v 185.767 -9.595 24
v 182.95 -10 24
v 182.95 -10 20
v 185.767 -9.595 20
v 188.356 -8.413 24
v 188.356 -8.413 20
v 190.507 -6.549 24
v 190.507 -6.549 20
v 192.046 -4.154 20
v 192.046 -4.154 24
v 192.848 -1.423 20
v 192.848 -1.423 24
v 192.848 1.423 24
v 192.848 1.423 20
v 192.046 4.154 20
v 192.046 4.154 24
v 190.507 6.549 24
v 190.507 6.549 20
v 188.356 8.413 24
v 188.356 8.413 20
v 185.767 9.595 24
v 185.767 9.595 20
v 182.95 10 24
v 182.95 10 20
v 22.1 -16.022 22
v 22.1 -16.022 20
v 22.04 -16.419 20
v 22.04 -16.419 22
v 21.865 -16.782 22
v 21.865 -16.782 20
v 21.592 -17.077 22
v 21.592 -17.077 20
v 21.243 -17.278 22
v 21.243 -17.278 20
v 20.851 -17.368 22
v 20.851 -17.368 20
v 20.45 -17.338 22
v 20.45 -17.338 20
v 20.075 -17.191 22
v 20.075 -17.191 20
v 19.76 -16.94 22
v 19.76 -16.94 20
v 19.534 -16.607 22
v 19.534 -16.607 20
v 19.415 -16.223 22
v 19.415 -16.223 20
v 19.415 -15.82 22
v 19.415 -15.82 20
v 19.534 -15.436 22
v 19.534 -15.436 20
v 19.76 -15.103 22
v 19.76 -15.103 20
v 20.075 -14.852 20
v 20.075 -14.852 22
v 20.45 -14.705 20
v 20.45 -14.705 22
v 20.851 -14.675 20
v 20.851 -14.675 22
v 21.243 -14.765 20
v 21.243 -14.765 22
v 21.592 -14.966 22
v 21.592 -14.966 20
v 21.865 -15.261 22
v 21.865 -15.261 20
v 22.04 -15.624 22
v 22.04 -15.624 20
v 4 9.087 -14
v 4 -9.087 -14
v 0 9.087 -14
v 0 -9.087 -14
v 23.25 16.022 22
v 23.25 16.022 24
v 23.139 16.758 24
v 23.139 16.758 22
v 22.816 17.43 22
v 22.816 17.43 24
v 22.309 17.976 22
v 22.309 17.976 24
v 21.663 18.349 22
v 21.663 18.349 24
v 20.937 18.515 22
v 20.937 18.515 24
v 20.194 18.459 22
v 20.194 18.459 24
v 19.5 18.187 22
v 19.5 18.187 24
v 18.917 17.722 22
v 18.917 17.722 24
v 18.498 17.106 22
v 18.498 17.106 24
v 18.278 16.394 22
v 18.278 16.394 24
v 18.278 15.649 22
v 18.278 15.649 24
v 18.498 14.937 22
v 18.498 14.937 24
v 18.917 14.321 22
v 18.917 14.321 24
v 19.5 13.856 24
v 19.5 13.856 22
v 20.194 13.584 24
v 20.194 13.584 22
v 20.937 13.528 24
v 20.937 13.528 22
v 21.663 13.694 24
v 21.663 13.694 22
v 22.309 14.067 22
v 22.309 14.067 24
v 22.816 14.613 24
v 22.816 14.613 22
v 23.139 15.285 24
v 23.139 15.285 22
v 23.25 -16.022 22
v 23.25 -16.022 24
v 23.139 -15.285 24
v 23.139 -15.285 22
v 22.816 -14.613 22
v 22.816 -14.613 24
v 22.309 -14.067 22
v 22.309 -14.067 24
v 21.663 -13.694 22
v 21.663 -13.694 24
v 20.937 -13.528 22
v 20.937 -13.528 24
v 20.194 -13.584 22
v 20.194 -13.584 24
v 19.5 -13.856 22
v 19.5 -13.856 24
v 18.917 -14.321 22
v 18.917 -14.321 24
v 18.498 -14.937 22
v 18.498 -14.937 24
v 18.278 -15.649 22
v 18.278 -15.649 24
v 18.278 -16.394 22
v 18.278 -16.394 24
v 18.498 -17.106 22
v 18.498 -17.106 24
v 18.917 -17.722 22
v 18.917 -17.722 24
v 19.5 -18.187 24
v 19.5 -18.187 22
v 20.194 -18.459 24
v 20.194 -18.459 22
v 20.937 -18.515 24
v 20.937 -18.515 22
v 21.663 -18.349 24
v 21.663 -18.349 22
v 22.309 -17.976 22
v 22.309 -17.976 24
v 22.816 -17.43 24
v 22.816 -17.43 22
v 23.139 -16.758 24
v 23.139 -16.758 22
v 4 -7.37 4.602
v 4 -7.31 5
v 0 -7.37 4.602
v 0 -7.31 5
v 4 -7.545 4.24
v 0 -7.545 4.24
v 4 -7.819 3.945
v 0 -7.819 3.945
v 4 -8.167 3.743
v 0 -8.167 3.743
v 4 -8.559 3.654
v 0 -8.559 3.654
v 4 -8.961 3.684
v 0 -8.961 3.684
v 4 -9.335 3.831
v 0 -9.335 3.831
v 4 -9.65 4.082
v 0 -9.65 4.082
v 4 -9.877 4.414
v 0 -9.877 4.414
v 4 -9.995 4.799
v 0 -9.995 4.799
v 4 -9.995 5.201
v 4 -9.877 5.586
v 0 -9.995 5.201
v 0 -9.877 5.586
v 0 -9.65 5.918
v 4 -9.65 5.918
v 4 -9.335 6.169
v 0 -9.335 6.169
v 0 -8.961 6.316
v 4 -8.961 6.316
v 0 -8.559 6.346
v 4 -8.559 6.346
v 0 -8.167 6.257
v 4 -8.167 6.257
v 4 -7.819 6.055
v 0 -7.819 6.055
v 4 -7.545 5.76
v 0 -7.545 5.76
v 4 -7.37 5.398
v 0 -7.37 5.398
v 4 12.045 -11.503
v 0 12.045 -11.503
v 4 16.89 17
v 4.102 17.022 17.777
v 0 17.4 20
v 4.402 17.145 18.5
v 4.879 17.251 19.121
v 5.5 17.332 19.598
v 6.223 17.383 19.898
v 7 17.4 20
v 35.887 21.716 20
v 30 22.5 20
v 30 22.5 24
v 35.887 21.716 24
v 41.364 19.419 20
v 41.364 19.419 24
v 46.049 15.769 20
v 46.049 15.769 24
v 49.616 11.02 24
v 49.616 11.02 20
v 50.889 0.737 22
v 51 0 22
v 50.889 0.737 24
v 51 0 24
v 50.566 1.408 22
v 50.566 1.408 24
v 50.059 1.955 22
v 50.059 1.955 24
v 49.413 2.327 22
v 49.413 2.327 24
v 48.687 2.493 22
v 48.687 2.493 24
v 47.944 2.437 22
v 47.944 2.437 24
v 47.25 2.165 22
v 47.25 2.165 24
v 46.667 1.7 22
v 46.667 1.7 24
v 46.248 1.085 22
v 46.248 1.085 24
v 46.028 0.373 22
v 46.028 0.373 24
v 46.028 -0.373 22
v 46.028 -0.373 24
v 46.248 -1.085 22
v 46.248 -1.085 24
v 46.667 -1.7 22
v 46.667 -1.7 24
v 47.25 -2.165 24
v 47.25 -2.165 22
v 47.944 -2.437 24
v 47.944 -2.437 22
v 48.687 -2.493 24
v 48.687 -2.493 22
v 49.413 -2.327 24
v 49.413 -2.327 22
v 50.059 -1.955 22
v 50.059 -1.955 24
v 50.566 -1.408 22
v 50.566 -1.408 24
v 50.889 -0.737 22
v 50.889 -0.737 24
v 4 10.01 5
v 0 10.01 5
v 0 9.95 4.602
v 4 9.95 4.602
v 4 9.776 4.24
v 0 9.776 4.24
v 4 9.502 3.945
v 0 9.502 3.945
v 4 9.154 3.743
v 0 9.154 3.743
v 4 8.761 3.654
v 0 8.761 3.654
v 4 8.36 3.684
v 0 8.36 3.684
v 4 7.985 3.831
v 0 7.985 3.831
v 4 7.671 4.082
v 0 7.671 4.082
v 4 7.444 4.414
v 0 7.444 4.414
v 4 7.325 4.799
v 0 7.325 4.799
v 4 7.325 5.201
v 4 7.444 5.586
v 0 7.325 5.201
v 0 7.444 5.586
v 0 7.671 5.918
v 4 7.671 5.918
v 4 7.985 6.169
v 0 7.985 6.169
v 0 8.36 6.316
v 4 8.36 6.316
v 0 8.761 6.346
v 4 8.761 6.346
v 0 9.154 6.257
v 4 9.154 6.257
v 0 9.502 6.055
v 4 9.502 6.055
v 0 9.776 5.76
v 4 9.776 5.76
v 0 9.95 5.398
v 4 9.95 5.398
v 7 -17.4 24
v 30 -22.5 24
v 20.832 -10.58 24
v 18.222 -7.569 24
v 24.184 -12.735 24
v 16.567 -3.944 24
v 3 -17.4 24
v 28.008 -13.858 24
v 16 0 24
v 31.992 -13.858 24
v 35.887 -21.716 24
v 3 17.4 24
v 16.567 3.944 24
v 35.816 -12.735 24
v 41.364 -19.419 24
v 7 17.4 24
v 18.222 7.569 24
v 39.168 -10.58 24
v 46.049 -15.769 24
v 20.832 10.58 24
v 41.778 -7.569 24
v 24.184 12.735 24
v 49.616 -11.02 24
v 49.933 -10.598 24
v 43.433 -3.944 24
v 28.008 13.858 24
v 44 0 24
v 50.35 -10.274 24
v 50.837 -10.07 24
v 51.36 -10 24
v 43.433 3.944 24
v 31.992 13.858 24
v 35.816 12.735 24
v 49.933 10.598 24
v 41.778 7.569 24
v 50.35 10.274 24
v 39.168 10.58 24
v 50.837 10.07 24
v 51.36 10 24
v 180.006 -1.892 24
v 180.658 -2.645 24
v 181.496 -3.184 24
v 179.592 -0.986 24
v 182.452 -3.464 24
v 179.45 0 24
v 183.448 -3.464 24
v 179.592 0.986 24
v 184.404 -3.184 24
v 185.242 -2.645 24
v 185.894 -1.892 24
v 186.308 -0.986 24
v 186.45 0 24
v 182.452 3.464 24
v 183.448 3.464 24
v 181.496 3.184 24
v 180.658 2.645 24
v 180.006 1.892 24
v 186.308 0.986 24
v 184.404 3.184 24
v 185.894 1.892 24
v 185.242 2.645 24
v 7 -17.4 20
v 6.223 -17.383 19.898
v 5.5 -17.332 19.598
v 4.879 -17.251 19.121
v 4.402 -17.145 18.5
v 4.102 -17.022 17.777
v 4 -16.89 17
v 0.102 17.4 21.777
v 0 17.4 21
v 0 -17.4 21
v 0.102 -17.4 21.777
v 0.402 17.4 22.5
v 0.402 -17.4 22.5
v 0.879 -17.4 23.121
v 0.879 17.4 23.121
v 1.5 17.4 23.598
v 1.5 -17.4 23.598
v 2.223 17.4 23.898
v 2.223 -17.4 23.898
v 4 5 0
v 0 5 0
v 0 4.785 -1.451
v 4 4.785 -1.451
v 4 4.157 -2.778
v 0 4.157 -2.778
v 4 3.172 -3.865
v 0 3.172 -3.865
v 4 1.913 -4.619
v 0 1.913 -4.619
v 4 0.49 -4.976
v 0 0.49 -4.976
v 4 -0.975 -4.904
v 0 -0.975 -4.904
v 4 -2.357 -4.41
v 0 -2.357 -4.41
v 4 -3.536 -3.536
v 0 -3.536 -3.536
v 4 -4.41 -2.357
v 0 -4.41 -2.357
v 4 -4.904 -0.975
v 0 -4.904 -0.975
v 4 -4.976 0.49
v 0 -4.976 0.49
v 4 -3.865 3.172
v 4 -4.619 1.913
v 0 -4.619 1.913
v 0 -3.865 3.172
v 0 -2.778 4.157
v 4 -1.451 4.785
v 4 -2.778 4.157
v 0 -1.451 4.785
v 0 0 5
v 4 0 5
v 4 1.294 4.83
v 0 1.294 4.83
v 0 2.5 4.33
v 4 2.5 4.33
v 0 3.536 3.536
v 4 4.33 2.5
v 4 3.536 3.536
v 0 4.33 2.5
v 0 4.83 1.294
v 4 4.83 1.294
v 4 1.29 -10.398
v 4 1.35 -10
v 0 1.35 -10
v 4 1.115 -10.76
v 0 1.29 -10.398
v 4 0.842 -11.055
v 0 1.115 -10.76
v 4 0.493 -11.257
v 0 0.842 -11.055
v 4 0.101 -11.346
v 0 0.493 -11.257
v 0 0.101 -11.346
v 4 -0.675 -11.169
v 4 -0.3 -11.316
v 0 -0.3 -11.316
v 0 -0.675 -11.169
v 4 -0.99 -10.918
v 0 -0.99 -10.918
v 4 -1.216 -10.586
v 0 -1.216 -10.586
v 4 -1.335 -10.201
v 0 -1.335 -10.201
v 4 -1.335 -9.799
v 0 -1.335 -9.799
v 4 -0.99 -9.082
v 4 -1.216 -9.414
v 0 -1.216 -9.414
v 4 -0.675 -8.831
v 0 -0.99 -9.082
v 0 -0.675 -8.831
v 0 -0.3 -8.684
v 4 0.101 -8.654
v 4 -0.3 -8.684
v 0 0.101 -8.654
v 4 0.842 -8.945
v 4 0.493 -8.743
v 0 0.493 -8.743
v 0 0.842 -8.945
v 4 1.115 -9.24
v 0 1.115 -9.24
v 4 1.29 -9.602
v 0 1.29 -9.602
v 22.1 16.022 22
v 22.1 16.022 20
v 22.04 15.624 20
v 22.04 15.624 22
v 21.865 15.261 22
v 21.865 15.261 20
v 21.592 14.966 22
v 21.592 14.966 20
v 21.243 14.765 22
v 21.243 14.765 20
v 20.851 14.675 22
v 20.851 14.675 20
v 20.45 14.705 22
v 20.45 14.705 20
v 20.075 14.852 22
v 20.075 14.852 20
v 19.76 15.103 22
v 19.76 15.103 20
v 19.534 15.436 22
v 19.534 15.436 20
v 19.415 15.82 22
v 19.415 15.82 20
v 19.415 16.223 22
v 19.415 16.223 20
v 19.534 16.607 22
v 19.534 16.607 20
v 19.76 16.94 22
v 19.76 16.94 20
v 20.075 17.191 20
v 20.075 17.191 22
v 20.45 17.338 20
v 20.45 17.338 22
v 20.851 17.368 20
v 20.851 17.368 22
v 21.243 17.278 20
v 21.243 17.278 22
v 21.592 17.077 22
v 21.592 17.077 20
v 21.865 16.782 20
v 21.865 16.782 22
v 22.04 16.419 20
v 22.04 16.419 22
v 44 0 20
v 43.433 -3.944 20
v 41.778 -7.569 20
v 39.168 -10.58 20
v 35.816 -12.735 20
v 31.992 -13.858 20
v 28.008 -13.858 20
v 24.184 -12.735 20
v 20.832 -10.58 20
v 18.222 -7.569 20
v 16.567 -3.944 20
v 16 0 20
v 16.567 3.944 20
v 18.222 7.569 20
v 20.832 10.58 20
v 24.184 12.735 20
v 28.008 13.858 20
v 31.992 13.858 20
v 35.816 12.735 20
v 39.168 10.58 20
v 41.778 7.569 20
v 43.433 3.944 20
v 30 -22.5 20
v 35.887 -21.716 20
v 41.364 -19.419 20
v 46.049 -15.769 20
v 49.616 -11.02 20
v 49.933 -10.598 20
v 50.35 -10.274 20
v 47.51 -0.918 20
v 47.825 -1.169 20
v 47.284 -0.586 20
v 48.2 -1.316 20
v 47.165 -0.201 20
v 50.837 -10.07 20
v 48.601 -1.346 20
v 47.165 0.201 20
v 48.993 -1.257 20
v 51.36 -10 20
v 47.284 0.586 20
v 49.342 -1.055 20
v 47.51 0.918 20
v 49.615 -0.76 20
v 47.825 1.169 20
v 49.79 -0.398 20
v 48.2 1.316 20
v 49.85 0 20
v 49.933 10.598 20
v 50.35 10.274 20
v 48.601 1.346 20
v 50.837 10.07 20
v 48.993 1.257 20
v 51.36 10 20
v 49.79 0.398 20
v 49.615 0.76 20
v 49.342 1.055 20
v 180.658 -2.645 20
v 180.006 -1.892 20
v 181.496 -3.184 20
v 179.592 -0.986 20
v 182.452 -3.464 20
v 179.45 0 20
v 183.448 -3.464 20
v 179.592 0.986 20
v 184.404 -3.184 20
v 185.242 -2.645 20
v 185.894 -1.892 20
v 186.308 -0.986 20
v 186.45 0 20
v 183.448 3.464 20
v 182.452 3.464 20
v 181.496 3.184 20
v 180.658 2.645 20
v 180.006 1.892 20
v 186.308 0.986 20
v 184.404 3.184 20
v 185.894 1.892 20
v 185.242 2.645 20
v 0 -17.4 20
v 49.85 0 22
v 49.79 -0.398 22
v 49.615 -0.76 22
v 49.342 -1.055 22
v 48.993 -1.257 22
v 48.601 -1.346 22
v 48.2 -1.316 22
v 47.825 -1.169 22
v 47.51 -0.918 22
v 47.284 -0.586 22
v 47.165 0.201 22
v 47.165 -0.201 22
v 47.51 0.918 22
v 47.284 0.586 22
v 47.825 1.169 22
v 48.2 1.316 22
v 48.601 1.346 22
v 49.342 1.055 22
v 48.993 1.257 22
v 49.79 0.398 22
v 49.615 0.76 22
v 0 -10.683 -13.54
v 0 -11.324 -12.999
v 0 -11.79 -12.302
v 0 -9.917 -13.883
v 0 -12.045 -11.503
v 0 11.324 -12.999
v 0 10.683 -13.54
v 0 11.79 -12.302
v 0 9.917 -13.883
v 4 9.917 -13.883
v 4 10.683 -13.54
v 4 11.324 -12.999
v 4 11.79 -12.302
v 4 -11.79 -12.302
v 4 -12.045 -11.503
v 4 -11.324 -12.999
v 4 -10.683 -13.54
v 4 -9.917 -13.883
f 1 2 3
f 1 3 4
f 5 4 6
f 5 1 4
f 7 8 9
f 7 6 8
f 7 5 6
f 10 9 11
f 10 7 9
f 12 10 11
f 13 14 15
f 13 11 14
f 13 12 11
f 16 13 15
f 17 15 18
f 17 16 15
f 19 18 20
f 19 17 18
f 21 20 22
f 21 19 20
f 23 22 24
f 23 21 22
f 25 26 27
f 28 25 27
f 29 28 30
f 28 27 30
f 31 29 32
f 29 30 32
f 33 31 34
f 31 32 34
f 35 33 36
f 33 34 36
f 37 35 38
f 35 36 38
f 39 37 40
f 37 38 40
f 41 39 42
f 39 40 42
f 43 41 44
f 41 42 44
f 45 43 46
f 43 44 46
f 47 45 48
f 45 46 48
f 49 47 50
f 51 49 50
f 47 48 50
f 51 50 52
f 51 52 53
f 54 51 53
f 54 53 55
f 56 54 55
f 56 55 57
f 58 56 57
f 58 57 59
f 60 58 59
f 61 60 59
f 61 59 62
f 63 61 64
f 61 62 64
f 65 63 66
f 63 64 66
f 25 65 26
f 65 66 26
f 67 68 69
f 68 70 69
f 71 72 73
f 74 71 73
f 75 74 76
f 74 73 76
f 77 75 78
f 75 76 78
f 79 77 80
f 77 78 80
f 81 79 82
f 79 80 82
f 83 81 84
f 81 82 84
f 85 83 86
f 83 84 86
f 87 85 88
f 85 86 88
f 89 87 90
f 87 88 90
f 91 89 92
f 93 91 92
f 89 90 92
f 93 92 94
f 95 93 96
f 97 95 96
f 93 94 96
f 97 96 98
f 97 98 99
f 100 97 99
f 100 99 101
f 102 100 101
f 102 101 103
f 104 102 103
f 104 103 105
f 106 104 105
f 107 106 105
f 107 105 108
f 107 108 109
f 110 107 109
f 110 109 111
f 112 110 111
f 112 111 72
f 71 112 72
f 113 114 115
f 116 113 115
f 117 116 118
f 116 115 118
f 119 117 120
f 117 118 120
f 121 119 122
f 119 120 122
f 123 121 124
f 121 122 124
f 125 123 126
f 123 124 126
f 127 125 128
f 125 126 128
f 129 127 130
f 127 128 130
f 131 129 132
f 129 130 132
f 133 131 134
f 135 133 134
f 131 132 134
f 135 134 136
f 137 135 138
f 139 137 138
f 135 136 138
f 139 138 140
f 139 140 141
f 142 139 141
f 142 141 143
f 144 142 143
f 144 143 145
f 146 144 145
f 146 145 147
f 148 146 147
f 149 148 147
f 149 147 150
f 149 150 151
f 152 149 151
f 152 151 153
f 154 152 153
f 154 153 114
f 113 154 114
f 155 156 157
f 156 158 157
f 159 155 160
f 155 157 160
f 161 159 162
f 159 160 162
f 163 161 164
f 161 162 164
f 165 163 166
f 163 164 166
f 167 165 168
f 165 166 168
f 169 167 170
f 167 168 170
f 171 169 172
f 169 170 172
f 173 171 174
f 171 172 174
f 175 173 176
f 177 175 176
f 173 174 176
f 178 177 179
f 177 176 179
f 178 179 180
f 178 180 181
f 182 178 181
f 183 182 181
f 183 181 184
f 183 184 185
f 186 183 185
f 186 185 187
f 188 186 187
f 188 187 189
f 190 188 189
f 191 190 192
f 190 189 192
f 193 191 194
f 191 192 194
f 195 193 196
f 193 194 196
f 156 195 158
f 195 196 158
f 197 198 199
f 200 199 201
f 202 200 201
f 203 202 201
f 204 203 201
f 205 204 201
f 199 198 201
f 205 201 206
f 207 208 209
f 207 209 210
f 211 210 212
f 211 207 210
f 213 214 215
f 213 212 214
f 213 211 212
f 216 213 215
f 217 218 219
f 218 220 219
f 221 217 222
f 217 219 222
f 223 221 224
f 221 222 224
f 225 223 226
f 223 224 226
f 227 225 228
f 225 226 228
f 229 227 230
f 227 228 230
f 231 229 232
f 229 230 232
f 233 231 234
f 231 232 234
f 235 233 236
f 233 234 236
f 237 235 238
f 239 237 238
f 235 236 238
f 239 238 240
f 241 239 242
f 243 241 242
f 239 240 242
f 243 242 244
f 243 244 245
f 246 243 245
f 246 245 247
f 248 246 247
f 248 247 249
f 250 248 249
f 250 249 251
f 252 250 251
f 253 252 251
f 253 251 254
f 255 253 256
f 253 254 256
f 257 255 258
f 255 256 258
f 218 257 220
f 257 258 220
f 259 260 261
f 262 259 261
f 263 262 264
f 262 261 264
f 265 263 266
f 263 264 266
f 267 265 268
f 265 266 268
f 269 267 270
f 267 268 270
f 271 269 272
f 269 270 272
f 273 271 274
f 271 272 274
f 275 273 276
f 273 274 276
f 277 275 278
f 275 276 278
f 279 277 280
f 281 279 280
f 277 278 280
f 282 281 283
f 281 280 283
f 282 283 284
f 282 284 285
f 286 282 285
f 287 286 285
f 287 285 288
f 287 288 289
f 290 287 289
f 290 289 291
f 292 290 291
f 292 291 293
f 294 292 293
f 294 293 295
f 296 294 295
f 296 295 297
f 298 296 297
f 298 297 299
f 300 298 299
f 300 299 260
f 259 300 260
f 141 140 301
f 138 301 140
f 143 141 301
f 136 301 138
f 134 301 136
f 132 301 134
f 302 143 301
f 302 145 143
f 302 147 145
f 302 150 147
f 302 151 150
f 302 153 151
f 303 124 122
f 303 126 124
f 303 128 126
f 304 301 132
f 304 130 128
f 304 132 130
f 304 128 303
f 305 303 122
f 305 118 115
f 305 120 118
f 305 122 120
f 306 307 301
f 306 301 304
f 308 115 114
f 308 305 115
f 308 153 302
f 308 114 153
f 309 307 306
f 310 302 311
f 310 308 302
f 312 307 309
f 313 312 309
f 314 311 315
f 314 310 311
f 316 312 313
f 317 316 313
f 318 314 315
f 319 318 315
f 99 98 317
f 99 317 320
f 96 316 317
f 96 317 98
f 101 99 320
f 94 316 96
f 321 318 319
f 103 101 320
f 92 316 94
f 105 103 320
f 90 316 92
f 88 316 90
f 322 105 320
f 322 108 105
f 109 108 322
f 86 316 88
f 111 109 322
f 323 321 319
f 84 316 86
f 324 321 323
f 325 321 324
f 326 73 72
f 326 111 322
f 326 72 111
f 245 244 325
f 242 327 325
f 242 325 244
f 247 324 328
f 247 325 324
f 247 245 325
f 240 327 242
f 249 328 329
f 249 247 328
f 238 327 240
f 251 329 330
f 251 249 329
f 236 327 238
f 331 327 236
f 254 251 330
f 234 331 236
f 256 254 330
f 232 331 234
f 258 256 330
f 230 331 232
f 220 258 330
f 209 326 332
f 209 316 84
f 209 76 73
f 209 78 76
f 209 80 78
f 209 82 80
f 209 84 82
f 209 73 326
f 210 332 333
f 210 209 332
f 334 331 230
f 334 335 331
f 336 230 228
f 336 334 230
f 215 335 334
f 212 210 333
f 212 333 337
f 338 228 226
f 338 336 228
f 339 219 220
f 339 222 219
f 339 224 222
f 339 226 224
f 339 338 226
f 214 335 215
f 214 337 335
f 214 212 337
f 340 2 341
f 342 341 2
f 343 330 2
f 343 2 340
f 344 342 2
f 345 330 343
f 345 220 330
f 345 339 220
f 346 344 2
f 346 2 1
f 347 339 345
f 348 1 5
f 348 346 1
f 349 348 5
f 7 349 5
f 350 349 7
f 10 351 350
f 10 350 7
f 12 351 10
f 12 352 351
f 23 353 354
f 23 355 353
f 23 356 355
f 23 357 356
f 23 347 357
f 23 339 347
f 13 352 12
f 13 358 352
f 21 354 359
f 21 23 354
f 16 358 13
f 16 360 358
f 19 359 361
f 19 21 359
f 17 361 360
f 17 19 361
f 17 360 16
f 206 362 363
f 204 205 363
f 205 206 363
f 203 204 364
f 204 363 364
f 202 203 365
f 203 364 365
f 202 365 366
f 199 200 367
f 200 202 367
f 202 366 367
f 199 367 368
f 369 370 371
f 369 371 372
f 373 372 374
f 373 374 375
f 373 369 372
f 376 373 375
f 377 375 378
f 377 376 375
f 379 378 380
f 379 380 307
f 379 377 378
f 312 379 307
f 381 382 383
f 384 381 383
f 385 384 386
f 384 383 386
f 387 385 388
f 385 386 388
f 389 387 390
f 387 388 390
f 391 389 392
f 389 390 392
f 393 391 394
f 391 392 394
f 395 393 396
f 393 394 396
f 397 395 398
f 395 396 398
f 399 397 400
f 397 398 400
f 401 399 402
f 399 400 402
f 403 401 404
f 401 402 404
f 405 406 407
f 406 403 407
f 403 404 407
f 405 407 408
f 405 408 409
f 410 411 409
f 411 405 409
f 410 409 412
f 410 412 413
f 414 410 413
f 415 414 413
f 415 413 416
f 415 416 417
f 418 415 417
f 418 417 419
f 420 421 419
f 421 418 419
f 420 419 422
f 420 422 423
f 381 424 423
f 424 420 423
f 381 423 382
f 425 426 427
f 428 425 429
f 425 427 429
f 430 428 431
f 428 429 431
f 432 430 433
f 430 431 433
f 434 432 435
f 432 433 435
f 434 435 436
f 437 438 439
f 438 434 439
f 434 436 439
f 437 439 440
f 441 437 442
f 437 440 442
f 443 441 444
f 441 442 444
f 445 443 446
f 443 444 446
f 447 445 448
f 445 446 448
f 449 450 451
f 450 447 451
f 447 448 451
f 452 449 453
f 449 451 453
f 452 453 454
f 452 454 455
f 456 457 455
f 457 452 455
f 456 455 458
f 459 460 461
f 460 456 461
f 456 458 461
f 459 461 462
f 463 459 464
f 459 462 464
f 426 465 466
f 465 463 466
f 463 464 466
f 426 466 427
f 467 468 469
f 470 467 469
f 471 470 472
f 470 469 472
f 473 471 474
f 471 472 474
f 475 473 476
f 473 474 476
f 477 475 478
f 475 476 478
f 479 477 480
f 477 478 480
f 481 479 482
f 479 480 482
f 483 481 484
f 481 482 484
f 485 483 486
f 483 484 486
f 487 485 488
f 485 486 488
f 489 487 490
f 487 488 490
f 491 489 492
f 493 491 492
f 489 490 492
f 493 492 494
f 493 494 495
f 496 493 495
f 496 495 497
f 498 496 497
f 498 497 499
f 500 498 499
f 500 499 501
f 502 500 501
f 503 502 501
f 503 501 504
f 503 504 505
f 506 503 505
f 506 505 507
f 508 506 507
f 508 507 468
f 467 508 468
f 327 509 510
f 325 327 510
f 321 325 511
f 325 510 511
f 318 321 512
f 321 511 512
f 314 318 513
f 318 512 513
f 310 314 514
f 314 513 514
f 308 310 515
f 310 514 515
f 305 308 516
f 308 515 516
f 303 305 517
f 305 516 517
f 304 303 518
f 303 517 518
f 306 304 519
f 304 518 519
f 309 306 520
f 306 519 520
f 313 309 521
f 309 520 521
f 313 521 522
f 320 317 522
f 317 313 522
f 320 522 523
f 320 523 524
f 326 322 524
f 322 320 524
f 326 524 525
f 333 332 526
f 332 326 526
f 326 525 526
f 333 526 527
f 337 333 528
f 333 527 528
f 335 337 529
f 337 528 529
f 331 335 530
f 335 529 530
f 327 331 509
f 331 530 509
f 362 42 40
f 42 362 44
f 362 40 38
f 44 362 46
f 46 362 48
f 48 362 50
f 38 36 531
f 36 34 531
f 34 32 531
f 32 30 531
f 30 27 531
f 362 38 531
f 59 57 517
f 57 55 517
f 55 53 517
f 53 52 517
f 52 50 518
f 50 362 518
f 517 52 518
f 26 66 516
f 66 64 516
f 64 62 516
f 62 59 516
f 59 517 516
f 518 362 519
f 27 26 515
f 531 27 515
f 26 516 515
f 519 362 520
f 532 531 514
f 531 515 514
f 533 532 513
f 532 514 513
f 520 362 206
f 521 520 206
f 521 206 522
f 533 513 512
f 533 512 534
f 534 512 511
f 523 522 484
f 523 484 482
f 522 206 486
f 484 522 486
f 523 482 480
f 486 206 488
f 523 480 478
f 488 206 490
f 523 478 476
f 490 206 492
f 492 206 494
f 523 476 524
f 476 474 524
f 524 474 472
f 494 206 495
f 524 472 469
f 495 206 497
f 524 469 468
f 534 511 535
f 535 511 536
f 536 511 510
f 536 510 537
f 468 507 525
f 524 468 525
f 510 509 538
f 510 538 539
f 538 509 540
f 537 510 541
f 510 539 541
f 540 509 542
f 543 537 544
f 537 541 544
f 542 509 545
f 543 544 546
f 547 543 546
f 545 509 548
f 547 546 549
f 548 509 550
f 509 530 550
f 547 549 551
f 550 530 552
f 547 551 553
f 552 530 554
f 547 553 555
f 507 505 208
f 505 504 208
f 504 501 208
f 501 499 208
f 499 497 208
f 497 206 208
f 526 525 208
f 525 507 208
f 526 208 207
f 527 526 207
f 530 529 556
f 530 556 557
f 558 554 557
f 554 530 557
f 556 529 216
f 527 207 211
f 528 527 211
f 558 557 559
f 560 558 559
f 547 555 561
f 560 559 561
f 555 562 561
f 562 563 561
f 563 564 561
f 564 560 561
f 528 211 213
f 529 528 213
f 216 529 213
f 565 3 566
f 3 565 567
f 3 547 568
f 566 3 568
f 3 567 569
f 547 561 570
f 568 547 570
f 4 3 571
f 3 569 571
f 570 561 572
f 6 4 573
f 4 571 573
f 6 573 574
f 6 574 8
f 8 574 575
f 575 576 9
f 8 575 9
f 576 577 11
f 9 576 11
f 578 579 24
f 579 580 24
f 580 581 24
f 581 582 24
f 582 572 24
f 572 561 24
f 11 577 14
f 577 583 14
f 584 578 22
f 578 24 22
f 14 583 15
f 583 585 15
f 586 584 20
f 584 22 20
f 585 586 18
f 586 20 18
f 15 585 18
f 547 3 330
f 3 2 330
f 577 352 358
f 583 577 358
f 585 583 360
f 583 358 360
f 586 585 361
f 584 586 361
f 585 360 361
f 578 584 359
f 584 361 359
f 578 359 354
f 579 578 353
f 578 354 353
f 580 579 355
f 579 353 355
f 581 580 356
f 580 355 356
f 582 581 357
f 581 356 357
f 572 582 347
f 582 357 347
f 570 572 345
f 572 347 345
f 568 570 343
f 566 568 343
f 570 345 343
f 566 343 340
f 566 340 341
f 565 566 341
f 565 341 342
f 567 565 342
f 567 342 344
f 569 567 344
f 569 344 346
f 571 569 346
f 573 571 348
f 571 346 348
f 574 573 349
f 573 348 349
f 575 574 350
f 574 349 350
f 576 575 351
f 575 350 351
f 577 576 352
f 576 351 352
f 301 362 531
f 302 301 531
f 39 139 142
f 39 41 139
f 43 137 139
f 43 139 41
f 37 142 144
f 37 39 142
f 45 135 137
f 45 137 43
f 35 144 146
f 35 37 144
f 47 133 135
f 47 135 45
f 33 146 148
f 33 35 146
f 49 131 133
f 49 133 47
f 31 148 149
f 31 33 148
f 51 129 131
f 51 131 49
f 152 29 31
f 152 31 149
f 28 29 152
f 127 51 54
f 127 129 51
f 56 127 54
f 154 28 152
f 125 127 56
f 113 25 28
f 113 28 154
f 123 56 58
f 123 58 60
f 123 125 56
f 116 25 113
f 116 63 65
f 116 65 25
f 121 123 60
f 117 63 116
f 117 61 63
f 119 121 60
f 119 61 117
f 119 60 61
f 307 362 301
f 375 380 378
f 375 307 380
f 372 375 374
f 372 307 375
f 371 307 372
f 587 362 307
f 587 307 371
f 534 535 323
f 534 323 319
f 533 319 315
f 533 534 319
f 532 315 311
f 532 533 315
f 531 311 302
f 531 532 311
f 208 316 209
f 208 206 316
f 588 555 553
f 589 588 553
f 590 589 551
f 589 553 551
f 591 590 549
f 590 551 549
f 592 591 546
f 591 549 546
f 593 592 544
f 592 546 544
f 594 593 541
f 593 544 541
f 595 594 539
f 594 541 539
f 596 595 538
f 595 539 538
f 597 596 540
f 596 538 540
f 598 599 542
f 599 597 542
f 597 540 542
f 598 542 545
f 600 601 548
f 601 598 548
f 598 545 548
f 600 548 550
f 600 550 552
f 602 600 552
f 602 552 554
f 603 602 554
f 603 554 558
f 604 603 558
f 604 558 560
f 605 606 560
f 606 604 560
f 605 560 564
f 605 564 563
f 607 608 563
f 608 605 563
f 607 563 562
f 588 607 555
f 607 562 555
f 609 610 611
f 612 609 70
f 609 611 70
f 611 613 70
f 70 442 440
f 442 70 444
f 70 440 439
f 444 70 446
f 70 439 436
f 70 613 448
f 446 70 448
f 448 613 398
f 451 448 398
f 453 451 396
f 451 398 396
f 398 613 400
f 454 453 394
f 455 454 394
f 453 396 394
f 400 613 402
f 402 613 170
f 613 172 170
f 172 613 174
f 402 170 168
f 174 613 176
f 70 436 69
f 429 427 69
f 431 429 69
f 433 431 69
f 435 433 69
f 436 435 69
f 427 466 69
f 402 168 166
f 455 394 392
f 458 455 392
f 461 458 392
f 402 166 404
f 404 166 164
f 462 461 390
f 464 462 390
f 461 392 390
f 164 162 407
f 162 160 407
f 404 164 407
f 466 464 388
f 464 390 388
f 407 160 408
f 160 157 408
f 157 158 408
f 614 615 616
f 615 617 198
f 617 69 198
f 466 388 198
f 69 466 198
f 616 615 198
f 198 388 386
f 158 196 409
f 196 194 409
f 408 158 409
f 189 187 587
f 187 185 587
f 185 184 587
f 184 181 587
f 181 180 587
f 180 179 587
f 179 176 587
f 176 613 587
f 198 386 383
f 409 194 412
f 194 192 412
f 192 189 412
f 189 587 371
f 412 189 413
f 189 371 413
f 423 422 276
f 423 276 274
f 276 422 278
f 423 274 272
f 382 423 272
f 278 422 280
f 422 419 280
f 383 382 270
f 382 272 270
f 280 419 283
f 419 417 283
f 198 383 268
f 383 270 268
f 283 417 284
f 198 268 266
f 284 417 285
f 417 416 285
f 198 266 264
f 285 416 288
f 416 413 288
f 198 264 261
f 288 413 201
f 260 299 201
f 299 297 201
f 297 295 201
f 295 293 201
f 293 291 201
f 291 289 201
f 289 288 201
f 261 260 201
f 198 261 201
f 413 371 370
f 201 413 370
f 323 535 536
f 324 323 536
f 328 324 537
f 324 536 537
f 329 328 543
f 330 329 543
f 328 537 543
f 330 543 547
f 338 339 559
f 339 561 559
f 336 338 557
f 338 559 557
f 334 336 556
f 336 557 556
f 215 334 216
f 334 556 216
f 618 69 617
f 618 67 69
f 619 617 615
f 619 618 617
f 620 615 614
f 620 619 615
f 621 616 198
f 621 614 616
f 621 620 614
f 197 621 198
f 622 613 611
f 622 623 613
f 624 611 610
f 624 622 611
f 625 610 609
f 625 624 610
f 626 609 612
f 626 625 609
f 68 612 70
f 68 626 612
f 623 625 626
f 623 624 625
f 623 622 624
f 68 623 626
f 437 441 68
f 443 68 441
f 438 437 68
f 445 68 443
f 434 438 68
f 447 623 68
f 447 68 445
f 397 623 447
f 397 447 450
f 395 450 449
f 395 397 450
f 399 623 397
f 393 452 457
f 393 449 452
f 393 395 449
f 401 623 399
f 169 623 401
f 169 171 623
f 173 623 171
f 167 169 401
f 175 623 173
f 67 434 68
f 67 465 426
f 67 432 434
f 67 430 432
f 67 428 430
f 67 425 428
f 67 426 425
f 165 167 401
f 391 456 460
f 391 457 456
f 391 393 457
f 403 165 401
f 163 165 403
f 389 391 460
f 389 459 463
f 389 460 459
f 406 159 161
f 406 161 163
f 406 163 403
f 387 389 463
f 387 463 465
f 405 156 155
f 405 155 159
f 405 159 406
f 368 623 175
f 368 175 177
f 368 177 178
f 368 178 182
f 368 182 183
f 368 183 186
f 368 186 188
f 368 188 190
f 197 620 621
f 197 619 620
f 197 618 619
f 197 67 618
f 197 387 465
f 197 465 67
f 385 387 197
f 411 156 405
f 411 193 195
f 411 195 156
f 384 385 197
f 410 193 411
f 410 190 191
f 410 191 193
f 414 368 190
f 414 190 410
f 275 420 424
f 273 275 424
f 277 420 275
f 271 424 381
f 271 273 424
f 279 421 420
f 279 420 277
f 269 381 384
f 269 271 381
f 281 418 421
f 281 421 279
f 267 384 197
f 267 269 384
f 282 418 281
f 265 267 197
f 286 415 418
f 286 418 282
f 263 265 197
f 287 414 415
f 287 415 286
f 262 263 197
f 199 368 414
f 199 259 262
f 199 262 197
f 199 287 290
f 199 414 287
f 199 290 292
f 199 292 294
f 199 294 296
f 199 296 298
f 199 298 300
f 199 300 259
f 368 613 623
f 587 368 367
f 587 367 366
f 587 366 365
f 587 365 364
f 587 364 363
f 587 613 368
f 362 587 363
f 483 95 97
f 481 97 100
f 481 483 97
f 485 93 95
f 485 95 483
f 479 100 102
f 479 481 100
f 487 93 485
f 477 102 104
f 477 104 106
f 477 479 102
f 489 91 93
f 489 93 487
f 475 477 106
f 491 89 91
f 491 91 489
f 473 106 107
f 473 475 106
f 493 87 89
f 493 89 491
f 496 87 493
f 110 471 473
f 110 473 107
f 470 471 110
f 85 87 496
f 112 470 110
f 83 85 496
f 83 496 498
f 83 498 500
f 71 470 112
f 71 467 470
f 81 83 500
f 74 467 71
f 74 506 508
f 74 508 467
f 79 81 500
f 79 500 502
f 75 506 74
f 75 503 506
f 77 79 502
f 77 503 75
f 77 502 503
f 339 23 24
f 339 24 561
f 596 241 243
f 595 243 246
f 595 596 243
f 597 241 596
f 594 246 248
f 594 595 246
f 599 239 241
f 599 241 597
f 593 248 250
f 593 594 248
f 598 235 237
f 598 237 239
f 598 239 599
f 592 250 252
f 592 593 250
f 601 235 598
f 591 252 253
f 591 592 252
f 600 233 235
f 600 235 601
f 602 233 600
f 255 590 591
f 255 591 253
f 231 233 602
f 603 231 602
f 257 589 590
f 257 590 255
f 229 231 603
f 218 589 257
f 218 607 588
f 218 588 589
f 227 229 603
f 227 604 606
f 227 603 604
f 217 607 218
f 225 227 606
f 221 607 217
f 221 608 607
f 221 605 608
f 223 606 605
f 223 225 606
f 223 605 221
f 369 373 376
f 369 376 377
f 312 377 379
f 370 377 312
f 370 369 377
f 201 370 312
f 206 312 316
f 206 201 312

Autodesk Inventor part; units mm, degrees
ref_plane "YZ Plane" through (0, 0, 0) normal (1, 0, 0) x (0, 1, 0)
ref_plane "XZ Plane" through (0, 0, 0) normal (0, 1, 0) x (-1, 0, 0)
ref_plane "XY Plane" through (0, 0, 0) normal (0, 0, 1) x (1, 0, 0)
sketch "スケッチ1" plane through (0, 0, 0) normal (1, 0, 0) x (0, 1, 0)
  circle A0 centre (0, 0) radius 10
  circle A1 centre (0, -10) radius 1.35
  circle A2 centre (8.6603, 5) radius 1.35
  circle A3 centre (-8.6603, 5) radius 1.35
  circle A4 centre (0, 0) radius 5
  line L0 (0, 0) -> (0, 50)
  circle A5 centre (0, 50) radius 22.5
  circle A6 centre (0, 0) radius 14
  line L1 (-14, 0) -> (-22.5, 50)
  line L2 (14, 0) -> (22.5, 50)
  line L3 (0, -14) -> (-11.62, -14)
  line L4 (-11.62, -14) -> (-14, 0)
  line L5 (0, -14) -> (11.62, -14)
  line L6 (11.62, -14) -> (14, 0)
  line L7 (0, 20) -> (-17.4, 20)
  line L8 (0, 20) -> (17.4, 20)
  dimension "d0" = 20
  dimension "d1" = 2.7
  dimension "d4" = 360
  dimension "d6" = 10
  dimension "d7" = 50
  dimension "d8" = 45
  dimension "d9" = 28
extrude "押し出し1" add sketch "スケッチ1" along normal blind 4 contours A0 A1 A3 A2 | A6 L6 L4 | A6 L1 L7 L0 | L0 L8 L2 A6 | L6 L5 A6 | A6 L3 L4
sketch "スケッチ2" plane through (0, -17.4, 20) normal (0, 0, 1) x (1, 0, 0)
  line L0 (0, 17.4) -> (30, 17.4)
  circle A0 centre (30, 17.4) radius 22.5
  circle A1 centre (30, 17.4) radius 18.5
  circle A2 centre (30, 17.4) radius 14
  circle A3 centre (48.5, 17.4) radius 1.35
  circle A4 centre (20.75, 33.4215) radius 1.35
  circle A5 centre (20.75, 1.3785) radius 1.35
  line L1 (0, 29.02) -> (0, 34.8) projected
  line L2 (0, 0) -> (0, 5.78) projected
  line L3 (0, 34.8) -> (0, 0)
  line L4 (4, 29.02) -> (4, 34.8) projected
  line L5 (4, 34.8) -> (7, 34.8)
  line L6 (7, 34.8) -> (30, 39.9)
  line L7 (4, 0) -> (4, 5.78) projected
  line L8 (4, 0) -> (7, 0)
  line L9 (7, 0) -> (30, -5.1)
  line L10 (4, 0) -> (0, 0)
  line L11 (0, 34.8) -> (4, 34.8) projected
  line L12 (0, 0) -> (0, 34.8)
  line L13 (0, 34.8) -> (4, 34.8)
  dimension "d14" = 37
  dimension "d12" = 30
  dimension "d13" = 45
  dimension "d15" = 28
  dimension "d16" = 2.7
  dimension "d19" = 360
  dimension "d21" = 3
  dimension "d22" = 3
extrude "押し出し2" add sketch "スケッチ2" along normal blind 4 contours L3 L1 L11 L5 L6 A0 L0 | L0 A0 L9 L8 L10 L2 L3 | A1 A4 A3 A5 | A0 L6 L9
fillet "フィレット1" radius 3 2 edges at (4, 0, 20) (0, 0, 24)
fillet "フィレット2" radius 3 2 edges at (2, -11.62, -14) (2, 11.62, -14)
sketch "スケッチ7" plane through (0, -17.4, 24) normal (0, 0, 1) x (1, 0, 0)
  circle A0 centre (30, 17.4) radius 14 projected
  line L0 (30, 17.4) -> (182.95, 17.4)
  line L1 (30, 17.4) -> (182.95, 17.4) construction
  circle A1 centre (182.95, 17.4) radius 3.5
  circle A2 centre (182.95, 17.4) radius 10
  line L2 (182.95, 27.4) -> (50.1556, 27.4)
  arc A3 (30, -5.1) -> (30, 39.9) centre (30, 17.4) ccw projected
  line L3 (182.95, 27.4) -> (315.7444, 27.4) construction
  line L4 (182.95, 7.4) -> (50.1556, 7.4)
  point P0 (0, 17.4)
  dimension "d55" = 152.95
  dimension "d56" = 0
  dimension "d57" = 7
  dimension "d58" = 20
  dimension "d59" = 180
extrude "押し出し7" add sketch "スケッチ7" against normal blind 4 contours A3 L2 A2 L0 | L0 A2 L4 A3 | A2
fillet "フィレット3" radius 2 2 edges at (50.1556, 10, 22) (50.1556, -10, 22)
sketch "スケッチ8" plane through (0, -17.4, 24) normal (0, 0, 1) x (1, 0, 0)
  circle A0 centre (20.75, 33.4215) radius 1.35 projected
  circle A1 centre (20.75, 33.4215) radius 2.5
  circle A2 centre (48.5, 17.4) radius 1.35 projected
  circle A3 centre (48.5, 17.4) radius 2.5
  circle A4 centre (20.75, 1.3785) radius 1.35 projected
  circle A5 centre (20.75, 1.3785) radius 2.5
  point P0 (0, 17.4)
  dimension "d63" = 5
  dimension "d64" = 5
  dimension "d65" = 5
extrude "押し出し8" cut sketch "スケッチ8" against normal blind 2 contours A0 | A1 | A3 | A4 | A5
properties part number "motor_holder_2" material "アルミニウム 6061"
